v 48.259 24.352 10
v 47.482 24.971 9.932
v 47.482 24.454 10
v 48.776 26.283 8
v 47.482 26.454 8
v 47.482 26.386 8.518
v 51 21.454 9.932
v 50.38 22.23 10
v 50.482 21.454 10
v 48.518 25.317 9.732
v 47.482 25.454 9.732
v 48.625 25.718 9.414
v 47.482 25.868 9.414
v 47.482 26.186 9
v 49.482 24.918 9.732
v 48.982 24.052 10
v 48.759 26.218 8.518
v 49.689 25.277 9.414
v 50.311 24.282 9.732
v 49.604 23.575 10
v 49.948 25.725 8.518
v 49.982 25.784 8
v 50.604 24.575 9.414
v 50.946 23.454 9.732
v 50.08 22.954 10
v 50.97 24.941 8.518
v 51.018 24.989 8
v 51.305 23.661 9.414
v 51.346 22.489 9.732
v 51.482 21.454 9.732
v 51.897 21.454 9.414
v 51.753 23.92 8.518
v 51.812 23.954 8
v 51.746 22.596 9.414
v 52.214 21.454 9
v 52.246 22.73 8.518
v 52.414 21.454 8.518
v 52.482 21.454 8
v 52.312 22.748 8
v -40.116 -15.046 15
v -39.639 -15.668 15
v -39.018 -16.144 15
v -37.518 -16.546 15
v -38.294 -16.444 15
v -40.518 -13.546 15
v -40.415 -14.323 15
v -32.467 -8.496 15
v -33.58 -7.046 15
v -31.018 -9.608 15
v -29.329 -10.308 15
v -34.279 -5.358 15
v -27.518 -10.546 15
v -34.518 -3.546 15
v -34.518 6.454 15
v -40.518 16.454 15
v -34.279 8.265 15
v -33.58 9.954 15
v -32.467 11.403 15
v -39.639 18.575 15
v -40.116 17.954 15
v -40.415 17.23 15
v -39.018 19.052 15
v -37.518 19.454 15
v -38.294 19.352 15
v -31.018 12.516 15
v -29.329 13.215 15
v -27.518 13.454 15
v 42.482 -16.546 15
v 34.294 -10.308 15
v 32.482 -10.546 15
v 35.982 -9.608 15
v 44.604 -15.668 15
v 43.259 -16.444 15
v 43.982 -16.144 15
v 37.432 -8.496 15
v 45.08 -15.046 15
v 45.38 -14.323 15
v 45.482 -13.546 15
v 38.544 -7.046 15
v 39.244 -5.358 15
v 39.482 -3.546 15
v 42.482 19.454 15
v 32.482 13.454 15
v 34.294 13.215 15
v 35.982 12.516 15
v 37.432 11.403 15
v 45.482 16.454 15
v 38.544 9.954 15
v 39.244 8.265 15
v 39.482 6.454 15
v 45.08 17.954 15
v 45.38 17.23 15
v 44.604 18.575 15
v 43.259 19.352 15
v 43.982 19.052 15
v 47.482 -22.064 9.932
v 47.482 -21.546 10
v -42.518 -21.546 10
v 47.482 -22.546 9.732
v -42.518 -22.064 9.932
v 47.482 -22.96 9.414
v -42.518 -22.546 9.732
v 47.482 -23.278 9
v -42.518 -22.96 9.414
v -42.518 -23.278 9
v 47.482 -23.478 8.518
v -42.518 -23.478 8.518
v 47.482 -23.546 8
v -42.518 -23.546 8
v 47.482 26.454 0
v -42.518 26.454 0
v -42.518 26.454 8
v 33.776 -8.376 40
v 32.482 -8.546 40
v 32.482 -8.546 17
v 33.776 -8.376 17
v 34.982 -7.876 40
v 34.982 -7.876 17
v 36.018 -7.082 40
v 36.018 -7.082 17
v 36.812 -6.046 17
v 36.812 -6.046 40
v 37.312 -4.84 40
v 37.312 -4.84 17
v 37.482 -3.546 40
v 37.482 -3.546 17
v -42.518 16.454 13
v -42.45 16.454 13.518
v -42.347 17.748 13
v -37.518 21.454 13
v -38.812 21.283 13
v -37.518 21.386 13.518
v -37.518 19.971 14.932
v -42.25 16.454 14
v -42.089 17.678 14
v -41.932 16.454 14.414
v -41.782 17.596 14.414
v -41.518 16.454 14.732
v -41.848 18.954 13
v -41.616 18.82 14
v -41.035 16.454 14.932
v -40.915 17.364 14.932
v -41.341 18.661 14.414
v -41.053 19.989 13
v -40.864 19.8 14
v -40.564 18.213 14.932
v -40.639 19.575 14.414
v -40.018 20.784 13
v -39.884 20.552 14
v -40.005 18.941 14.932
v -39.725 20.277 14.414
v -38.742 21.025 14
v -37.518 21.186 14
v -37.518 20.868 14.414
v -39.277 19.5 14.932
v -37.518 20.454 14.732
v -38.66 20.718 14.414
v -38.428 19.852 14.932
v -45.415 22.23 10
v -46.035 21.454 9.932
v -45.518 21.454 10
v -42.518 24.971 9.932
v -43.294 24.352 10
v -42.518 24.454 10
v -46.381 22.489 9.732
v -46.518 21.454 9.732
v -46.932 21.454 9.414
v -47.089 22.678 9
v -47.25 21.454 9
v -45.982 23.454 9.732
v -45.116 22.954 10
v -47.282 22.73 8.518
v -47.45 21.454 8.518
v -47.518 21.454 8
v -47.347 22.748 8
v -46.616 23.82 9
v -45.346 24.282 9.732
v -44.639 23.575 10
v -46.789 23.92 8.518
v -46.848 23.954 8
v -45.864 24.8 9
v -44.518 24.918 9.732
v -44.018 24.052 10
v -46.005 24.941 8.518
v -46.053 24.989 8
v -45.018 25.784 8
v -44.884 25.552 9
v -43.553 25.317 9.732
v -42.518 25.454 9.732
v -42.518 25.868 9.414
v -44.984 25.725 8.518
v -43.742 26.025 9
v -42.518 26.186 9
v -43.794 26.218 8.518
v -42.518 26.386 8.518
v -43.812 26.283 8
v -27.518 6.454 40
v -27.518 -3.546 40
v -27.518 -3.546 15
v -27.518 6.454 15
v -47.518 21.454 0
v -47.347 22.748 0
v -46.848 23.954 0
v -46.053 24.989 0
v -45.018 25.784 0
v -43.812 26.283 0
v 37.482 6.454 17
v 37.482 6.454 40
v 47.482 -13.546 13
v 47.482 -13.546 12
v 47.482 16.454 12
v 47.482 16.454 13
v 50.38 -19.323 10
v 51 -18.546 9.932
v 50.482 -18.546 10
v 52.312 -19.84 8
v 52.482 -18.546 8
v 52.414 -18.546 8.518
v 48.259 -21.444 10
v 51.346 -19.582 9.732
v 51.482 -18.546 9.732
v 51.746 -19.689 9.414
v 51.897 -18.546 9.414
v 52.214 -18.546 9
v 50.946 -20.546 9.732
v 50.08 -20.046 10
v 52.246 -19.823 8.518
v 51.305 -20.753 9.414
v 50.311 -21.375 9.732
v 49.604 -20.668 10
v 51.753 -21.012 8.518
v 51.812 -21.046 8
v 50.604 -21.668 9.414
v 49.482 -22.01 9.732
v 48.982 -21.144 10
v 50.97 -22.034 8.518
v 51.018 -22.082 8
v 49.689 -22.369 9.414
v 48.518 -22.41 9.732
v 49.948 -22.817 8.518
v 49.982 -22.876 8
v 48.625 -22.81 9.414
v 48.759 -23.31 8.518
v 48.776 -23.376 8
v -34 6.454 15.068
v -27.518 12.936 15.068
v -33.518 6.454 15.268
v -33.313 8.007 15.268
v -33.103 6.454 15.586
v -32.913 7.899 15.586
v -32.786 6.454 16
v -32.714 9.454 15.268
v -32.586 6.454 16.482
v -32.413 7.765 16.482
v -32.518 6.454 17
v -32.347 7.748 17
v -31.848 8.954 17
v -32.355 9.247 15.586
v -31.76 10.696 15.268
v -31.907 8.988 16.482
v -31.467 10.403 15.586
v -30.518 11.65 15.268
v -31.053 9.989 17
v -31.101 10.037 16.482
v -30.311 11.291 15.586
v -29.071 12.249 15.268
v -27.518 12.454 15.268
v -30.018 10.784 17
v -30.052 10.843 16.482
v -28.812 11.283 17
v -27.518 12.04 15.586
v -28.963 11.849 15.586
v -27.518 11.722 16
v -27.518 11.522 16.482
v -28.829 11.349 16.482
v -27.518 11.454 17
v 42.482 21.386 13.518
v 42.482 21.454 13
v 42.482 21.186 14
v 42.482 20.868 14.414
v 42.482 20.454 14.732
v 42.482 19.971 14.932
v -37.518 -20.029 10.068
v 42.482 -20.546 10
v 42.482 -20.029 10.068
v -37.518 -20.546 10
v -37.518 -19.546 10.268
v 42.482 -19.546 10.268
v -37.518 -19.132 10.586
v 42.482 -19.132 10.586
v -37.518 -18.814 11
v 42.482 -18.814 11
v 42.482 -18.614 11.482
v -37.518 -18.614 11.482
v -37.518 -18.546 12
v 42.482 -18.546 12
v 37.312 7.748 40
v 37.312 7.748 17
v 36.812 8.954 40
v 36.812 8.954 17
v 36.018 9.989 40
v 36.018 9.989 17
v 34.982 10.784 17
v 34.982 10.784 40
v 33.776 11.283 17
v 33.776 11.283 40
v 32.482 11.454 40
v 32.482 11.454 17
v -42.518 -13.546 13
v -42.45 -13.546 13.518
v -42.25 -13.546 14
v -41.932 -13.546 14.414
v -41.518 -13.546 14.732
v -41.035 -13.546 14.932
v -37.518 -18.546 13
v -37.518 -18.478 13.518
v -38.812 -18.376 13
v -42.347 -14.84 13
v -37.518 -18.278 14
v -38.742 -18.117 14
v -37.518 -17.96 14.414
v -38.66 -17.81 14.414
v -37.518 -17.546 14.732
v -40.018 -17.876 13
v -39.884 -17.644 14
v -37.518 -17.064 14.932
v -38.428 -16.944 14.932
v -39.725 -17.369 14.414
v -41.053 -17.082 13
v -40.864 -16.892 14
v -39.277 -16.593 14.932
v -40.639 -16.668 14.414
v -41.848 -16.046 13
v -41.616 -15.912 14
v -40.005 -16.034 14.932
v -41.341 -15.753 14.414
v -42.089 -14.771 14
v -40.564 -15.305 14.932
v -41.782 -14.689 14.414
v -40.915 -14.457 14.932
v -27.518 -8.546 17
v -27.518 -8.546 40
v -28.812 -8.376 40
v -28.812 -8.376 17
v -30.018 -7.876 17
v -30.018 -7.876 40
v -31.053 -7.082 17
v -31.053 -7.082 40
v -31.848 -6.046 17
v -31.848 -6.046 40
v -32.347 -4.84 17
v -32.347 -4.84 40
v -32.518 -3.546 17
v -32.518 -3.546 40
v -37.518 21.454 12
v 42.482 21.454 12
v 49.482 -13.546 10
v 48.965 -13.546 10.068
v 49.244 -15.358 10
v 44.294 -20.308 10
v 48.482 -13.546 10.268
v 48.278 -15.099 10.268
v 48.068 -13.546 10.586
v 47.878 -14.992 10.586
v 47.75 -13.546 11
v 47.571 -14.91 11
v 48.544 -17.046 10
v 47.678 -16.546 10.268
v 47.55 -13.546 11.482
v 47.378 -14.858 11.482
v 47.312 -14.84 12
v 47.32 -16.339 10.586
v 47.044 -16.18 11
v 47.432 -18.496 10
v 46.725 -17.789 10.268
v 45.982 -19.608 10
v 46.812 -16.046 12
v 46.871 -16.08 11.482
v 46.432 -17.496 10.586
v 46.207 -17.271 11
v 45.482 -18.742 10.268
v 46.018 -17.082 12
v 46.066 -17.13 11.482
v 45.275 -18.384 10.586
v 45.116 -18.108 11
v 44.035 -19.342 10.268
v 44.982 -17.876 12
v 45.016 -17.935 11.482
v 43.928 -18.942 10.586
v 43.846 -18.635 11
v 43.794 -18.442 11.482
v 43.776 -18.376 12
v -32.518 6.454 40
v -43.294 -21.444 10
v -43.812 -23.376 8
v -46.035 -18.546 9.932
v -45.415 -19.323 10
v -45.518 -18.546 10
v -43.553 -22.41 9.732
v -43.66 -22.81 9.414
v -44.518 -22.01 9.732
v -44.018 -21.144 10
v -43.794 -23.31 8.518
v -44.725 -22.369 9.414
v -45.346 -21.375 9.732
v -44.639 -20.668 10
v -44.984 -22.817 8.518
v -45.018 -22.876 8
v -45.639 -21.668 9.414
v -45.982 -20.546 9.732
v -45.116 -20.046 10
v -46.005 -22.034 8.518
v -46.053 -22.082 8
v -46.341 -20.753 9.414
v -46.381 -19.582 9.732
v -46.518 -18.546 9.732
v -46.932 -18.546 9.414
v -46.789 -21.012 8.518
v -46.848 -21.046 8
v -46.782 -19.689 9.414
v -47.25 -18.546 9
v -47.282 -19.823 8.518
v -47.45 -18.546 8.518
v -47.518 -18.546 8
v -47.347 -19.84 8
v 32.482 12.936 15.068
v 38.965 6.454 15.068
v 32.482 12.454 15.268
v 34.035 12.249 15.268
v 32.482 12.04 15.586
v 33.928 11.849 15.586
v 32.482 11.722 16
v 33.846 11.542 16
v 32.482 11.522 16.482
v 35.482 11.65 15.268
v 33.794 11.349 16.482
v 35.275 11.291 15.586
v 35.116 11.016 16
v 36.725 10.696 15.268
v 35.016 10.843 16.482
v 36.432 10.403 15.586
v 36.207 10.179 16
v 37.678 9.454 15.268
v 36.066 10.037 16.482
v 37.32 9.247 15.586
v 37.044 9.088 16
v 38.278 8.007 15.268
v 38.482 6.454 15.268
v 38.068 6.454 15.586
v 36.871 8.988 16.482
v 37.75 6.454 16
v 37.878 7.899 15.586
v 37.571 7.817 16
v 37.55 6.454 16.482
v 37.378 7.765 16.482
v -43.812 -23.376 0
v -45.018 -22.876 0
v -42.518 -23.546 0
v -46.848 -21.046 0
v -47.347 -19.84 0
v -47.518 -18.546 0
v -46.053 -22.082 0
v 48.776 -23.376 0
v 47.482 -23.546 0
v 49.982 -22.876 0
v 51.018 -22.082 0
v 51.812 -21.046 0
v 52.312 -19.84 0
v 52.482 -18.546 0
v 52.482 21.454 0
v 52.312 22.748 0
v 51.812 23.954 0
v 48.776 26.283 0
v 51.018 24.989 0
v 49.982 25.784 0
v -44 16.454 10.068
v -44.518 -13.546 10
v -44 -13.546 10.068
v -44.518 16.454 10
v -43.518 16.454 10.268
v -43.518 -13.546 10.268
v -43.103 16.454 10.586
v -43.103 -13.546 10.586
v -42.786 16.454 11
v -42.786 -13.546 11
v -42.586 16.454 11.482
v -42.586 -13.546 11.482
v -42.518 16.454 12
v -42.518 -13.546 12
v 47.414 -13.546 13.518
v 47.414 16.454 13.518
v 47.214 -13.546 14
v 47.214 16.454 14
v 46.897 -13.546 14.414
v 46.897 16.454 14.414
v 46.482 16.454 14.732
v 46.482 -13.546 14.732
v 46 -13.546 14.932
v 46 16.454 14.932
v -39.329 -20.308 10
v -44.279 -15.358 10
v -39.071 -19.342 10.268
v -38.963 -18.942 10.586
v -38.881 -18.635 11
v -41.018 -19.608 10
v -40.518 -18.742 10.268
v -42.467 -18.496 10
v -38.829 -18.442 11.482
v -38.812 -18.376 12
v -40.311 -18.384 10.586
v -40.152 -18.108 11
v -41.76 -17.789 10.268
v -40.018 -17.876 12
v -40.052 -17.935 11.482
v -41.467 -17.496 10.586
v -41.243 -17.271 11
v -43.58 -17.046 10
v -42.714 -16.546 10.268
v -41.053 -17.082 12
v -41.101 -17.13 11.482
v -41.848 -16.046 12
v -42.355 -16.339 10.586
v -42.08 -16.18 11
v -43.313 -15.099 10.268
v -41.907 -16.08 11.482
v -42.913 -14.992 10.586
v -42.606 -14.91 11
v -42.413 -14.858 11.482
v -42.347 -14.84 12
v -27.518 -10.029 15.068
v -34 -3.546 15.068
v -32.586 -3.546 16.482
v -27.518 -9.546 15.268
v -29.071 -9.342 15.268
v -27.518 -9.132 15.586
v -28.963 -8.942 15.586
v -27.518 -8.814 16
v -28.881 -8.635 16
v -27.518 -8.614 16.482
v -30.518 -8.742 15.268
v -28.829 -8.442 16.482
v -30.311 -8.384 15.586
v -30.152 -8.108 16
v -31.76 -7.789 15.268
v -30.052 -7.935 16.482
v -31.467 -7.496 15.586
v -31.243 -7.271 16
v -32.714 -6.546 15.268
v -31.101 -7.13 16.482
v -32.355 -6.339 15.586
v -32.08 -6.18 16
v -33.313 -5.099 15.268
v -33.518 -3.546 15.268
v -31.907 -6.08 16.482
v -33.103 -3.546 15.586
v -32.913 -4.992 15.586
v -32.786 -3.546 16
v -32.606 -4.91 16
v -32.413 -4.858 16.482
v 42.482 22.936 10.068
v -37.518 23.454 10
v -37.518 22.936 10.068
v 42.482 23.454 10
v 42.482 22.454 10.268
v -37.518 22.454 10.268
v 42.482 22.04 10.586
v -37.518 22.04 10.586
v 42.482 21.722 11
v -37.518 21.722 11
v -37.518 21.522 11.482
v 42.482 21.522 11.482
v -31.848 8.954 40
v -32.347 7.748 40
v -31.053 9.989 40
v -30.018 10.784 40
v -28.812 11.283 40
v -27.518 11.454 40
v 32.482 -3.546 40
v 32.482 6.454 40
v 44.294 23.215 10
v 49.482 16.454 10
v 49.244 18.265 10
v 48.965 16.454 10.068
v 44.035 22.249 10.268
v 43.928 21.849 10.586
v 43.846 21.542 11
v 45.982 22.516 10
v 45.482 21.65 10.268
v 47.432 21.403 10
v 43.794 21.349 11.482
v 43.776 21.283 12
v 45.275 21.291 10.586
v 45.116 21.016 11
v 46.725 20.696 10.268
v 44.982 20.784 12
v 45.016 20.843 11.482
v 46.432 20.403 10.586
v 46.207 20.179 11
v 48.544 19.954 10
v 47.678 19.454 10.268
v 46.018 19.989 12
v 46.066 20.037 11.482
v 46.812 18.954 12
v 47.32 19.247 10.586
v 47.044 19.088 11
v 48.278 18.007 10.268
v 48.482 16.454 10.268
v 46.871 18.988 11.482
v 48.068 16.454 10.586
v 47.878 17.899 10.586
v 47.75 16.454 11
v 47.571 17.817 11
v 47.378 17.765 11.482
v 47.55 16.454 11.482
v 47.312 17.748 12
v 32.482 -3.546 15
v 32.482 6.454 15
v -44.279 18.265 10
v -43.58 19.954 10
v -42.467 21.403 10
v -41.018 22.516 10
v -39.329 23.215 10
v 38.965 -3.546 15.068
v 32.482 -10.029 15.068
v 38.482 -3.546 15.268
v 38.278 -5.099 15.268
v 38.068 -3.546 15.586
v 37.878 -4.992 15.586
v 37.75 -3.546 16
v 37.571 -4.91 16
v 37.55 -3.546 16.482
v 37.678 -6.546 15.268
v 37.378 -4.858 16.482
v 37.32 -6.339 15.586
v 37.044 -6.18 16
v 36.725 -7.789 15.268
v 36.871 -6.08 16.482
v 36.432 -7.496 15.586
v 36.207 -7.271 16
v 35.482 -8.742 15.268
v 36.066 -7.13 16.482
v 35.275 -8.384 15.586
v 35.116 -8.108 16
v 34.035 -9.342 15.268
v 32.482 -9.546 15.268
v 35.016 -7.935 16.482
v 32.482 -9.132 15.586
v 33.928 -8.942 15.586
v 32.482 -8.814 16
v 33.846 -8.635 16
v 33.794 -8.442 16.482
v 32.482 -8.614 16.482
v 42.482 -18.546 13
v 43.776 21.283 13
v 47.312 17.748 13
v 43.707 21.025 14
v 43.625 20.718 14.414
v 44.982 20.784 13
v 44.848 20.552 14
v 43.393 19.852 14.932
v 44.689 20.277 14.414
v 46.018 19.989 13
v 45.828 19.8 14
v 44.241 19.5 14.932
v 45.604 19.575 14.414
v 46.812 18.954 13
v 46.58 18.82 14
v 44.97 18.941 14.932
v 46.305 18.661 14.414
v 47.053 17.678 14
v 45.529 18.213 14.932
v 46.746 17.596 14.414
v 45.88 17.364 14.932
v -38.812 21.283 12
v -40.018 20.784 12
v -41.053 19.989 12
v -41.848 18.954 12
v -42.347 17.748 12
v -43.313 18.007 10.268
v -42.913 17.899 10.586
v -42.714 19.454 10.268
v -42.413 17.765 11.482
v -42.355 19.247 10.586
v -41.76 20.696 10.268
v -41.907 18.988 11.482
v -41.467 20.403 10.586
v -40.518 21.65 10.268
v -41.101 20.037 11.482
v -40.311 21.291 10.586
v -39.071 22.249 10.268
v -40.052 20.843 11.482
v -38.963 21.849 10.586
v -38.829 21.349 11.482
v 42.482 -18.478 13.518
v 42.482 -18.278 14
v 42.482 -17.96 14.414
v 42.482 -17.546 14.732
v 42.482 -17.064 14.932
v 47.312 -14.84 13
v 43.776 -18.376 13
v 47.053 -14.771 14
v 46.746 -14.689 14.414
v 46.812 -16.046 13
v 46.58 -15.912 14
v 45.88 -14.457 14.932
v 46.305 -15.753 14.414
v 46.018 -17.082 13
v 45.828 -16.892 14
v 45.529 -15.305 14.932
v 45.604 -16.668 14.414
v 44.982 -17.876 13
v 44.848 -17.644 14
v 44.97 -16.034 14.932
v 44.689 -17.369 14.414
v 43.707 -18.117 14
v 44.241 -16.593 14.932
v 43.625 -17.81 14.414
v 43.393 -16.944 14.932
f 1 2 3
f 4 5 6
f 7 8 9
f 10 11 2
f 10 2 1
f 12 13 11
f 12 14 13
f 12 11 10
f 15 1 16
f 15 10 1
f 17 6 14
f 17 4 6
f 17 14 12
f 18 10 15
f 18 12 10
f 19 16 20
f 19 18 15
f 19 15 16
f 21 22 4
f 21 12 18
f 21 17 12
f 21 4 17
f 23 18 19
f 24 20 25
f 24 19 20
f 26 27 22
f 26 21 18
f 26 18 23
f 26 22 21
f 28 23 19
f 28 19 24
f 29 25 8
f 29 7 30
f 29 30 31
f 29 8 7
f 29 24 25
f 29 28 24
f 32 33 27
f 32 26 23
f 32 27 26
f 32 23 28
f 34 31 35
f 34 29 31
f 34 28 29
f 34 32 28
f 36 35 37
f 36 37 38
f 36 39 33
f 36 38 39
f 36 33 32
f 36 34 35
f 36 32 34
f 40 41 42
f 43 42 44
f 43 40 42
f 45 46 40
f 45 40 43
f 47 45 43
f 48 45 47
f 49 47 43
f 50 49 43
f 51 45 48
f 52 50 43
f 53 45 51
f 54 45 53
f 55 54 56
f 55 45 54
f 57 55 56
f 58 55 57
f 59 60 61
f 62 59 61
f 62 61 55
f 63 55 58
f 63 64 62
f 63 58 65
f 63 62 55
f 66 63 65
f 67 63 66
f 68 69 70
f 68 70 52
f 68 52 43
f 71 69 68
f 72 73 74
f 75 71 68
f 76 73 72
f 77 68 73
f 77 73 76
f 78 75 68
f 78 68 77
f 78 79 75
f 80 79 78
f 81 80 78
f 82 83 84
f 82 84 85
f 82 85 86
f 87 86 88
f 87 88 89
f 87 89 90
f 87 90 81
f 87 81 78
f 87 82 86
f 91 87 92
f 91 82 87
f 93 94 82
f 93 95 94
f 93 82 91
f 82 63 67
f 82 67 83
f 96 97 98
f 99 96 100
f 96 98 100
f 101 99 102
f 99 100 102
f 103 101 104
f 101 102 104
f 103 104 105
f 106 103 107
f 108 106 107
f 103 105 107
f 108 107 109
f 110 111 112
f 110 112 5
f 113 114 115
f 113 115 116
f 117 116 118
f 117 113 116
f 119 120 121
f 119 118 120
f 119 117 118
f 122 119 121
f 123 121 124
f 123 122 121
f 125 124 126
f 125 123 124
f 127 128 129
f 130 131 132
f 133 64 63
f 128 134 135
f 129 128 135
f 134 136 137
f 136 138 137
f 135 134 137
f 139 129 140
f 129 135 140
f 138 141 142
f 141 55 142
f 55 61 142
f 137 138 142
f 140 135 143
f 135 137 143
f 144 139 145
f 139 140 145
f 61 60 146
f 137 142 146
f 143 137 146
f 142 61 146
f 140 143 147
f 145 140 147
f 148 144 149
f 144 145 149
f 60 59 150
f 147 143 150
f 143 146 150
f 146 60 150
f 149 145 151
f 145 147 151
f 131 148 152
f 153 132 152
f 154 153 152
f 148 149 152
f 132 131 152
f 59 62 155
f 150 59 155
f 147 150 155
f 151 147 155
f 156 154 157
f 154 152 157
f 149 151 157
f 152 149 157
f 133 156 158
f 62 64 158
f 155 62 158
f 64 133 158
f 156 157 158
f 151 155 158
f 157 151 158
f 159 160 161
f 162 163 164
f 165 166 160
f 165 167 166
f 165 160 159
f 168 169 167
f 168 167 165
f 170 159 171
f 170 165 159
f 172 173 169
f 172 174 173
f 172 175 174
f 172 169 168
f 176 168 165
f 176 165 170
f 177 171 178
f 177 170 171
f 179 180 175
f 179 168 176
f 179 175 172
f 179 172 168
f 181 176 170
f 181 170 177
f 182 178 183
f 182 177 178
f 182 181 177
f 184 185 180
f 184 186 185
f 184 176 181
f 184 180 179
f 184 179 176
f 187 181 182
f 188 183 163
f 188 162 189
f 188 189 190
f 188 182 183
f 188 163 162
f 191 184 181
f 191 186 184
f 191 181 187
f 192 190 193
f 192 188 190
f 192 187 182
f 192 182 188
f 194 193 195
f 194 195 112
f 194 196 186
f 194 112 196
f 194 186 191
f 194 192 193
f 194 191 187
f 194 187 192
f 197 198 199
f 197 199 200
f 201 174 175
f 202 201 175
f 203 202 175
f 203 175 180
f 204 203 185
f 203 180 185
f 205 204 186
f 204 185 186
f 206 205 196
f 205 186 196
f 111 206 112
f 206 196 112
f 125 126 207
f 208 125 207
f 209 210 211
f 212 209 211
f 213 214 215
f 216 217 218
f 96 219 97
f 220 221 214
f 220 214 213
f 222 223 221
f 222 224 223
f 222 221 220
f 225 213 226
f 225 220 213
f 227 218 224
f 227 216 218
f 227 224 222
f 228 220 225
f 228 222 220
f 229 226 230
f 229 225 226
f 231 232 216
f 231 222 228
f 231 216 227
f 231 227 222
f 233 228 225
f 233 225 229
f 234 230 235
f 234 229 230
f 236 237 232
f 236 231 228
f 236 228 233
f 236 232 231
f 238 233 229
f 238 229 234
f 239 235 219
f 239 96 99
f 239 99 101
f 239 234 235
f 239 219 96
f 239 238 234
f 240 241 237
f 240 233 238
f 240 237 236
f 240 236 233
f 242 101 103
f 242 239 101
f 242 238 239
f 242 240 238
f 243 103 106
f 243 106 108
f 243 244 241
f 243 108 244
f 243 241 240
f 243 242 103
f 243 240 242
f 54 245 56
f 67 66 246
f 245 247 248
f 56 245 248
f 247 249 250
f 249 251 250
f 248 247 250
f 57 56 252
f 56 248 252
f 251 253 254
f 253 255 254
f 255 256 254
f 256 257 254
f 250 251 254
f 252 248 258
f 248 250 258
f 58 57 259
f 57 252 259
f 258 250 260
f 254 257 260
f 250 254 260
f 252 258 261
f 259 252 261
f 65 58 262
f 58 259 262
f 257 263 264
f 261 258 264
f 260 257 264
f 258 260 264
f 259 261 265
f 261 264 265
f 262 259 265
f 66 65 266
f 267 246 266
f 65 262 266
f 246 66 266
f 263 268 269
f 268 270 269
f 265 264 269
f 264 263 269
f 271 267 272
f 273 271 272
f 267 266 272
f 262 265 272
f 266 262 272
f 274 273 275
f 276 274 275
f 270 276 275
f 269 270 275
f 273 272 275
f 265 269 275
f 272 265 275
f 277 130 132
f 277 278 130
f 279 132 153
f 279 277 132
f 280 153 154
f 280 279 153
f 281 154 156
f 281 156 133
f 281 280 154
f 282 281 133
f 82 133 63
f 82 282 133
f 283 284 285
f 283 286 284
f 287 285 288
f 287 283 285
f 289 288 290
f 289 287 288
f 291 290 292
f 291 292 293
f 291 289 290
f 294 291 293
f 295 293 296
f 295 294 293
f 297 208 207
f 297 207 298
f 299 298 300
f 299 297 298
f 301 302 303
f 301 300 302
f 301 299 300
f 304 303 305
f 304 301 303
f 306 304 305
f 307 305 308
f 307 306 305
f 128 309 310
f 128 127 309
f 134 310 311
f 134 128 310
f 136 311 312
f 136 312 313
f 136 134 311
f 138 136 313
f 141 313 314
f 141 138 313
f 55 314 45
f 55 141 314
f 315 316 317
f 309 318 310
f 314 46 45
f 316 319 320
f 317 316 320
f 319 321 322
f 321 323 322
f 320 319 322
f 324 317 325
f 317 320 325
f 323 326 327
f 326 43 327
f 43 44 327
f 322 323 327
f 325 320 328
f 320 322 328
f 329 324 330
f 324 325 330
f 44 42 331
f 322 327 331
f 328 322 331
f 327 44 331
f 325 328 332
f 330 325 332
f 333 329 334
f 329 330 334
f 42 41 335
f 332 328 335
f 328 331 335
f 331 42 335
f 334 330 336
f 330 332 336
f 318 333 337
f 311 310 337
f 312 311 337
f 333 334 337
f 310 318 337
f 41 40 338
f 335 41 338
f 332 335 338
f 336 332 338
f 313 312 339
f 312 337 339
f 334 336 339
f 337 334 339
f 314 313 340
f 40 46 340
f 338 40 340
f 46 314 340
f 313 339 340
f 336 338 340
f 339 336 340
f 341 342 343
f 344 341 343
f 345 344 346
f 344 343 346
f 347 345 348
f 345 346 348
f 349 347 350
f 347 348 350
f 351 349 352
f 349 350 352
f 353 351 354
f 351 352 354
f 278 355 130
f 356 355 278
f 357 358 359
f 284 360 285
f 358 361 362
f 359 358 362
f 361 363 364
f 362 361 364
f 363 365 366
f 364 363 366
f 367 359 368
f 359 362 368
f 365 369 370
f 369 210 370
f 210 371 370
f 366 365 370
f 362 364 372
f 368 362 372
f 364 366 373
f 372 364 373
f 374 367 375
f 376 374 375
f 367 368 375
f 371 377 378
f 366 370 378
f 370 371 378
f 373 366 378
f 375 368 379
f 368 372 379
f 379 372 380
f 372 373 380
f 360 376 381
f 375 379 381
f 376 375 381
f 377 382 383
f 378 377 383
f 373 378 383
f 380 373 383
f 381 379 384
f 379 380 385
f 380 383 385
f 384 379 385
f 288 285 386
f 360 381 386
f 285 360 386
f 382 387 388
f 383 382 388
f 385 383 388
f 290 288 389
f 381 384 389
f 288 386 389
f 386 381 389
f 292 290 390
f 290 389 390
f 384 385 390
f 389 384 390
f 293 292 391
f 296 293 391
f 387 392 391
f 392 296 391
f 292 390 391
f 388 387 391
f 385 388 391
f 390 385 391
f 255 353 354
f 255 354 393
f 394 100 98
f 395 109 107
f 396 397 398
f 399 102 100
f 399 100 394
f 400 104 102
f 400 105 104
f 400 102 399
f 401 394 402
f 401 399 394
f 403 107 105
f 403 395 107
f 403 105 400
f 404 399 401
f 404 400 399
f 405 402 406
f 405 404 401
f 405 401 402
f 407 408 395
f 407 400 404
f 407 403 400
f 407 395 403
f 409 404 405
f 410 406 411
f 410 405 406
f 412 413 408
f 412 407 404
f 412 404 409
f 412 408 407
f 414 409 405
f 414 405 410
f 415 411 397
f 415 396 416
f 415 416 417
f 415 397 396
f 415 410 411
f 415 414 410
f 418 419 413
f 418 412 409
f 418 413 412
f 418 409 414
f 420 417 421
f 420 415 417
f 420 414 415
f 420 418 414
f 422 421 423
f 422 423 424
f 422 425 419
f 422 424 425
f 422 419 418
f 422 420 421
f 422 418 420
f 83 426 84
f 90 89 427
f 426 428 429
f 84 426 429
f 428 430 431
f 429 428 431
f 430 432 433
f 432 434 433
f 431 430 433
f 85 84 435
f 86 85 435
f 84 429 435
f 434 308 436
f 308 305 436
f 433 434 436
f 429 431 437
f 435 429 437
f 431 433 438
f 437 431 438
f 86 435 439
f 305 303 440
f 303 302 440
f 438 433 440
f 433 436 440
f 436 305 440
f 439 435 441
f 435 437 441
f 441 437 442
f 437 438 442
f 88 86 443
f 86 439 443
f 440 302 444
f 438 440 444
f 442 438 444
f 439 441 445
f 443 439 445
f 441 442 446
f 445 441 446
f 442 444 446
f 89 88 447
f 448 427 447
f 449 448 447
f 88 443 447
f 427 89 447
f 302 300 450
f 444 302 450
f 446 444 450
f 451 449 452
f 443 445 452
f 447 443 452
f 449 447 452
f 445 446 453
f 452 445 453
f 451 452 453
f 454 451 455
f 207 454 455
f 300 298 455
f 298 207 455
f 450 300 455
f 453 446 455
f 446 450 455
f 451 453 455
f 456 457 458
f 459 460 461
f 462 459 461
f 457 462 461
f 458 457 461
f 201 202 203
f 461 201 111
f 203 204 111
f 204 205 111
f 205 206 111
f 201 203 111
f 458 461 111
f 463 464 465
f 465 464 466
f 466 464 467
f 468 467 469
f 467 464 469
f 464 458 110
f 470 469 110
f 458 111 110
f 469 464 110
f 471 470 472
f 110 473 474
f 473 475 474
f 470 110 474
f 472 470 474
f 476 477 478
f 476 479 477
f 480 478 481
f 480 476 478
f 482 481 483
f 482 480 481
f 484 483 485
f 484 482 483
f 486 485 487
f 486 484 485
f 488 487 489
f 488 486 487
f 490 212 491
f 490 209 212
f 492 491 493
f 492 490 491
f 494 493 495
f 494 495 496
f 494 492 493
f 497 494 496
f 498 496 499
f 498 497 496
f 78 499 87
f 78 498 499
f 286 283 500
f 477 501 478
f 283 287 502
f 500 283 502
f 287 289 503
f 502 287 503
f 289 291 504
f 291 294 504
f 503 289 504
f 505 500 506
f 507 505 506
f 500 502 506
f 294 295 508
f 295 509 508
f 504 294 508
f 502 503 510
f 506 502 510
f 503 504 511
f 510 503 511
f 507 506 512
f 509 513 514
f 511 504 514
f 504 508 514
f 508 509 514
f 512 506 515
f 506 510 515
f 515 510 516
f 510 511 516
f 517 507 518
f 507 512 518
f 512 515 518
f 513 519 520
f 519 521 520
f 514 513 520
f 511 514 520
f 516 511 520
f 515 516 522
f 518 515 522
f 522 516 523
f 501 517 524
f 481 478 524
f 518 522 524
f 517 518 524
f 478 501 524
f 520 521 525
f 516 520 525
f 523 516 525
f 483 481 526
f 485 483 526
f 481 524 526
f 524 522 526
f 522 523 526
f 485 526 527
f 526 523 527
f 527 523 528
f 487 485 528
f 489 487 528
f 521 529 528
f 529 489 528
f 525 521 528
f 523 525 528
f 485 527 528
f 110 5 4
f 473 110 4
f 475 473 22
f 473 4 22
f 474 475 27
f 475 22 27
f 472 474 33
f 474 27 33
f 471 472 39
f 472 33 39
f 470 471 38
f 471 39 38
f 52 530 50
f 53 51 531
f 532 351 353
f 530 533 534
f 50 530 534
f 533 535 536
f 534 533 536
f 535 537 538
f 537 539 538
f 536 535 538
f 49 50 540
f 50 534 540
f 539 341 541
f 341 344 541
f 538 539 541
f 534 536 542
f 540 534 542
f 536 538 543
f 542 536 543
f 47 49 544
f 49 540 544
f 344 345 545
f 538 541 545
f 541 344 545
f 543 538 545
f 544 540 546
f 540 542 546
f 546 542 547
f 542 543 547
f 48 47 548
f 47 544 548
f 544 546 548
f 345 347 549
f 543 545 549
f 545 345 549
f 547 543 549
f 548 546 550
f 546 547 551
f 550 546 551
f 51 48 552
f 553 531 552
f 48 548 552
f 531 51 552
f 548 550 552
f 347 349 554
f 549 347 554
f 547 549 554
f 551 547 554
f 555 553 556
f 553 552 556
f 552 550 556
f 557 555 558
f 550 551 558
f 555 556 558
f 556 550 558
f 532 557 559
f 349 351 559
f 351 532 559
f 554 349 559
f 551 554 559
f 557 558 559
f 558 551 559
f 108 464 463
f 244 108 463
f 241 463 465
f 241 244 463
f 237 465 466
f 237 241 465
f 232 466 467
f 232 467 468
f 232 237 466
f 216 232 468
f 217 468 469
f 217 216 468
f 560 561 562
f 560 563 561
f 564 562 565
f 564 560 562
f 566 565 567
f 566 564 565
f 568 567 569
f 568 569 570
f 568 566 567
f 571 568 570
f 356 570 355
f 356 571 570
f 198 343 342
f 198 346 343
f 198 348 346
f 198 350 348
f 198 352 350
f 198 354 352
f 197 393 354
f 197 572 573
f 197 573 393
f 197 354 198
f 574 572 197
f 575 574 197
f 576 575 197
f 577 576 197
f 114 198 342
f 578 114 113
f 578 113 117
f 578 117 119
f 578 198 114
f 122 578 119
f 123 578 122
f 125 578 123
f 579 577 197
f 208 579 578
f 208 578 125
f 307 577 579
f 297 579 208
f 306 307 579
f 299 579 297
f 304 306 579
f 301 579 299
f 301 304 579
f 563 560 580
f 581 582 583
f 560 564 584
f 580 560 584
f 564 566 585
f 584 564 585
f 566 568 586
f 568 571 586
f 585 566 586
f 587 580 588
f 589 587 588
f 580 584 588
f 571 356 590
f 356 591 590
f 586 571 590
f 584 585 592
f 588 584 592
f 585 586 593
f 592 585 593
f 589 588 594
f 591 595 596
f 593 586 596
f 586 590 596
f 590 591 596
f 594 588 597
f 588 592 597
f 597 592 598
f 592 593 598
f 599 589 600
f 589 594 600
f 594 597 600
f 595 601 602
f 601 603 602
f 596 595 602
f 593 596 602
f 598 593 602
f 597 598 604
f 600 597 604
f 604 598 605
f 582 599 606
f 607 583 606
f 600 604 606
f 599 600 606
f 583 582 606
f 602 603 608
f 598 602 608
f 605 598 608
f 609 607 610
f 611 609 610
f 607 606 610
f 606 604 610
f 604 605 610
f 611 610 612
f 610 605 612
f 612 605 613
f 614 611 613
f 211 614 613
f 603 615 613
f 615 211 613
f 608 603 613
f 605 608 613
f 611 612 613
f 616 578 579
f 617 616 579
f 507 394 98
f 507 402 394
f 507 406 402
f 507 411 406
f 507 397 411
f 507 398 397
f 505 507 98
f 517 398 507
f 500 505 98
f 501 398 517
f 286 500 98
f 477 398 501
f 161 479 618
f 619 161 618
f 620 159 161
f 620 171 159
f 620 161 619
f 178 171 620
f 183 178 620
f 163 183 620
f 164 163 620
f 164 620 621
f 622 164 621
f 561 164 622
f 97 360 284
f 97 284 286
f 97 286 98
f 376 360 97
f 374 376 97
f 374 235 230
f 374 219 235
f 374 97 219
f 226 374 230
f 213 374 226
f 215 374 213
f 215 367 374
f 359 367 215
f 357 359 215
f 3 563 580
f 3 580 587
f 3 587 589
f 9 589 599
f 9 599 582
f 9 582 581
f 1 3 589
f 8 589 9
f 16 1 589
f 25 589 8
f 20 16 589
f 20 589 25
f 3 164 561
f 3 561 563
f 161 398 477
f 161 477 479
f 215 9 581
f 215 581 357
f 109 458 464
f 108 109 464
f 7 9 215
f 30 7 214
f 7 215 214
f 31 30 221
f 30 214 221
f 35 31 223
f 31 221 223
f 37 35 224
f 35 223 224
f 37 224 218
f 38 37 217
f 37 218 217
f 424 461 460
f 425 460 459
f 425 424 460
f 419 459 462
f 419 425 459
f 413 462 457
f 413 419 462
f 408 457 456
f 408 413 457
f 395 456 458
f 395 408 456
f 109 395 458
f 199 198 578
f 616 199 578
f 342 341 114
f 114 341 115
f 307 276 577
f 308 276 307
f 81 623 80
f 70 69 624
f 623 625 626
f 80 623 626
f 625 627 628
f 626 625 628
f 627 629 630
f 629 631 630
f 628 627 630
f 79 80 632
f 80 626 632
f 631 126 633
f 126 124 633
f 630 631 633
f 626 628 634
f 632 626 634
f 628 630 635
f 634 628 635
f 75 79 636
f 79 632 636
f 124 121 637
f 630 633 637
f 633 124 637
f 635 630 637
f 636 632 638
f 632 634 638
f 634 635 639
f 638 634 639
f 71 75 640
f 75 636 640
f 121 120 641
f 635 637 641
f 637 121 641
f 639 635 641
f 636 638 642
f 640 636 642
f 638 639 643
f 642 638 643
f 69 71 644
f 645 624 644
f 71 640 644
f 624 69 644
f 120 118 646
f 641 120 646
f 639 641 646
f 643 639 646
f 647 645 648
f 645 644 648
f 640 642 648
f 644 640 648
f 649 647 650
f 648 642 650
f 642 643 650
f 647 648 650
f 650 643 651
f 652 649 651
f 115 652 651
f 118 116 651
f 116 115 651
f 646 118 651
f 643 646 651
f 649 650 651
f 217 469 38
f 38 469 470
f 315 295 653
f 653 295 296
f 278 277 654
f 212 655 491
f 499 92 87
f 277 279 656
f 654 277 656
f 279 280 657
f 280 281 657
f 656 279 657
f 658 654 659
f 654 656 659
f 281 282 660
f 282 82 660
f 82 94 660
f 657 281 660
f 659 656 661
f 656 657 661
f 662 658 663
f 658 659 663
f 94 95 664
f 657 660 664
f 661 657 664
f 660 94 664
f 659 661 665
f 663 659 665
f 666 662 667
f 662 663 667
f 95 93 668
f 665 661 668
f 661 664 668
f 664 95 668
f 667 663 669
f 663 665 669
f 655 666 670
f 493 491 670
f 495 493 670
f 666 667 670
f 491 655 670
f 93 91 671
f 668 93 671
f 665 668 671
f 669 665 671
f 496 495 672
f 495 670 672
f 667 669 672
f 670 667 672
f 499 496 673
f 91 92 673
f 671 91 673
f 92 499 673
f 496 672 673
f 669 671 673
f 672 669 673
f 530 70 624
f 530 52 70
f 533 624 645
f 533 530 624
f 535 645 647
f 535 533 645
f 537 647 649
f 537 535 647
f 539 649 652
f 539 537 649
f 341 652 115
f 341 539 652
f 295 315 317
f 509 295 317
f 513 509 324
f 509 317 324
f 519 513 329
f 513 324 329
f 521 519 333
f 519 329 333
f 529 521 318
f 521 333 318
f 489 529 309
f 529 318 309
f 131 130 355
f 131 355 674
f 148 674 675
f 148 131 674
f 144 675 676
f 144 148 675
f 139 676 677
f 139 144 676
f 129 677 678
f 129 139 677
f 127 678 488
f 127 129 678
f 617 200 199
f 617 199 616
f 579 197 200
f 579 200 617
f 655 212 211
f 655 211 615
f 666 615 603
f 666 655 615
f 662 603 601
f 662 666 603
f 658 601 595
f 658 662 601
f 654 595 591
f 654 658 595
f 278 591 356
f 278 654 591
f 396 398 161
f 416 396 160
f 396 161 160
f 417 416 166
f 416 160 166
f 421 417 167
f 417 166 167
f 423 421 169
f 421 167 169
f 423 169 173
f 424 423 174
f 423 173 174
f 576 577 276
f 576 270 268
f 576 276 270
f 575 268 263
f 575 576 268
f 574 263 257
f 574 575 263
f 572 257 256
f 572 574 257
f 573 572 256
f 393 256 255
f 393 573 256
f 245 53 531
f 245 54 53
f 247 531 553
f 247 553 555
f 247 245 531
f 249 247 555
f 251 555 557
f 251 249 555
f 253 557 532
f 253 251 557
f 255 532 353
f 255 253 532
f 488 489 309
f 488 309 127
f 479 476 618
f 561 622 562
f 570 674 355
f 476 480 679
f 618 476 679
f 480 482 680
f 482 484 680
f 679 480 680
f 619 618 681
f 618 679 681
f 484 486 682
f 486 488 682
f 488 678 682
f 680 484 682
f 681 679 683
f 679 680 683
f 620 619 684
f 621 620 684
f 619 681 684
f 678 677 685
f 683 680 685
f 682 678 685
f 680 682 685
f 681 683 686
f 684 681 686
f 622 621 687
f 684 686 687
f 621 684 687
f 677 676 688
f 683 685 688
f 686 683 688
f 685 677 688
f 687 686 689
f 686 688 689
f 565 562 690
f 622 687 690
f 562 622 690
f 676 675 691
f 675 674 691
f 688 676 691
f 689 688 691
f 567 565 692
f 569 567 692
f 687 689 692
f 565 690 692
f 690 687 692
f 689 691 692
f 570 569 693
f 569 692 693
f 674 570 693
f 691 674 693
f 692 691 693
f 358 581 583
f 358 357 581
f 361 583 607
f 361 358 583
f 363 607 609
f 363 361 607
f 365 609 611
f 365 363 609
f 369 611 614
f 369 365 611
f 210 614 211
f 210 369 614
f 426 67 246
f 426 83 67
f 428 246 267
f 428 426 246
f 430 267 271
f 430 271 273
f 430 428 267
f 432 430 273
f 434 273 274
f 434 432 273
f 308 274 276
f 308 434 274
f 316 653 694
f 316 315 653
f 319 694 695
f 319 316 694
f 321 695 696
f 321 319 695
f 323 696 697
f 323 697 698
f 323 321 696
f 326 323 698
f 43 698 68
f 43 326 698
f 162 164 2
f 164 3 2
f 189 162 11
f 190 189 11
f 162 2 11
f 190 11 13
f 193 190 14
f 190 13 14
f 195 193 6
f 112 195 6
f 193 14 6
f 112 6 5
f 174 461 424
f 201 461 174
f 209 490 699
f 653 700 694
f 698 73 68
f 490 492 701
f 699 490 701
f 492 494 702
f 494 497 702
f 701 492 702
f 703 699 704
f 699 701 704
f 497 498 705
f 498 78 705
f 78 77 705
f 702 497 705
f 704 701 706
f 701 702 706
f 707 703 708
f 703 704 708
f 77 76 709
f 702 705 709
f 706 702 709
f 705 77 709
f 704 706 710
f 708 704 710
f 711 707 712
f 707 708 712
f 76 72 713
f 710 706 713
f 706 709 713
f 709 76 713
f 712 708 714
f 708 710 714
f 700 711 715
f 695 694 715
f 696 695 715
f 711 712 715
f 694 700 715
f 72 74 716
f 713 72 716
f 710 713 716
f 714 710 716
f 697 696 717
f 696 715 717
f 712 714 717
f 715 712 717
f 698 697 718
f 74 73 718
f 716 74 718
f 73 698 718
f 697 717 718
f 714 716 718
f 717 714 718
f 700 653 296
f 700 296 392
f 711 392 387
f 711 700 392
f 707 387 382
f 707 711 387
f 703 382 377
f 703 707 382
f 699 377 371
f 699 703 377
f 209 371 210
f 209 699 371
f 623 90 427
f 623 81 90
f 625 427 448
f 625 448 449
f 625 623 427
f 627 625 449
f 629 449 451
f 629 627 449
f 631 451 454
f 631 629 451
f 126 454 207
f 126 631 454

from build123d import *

# Parameters (mm, degrees)
F0_W     = 100
F0_H     = 50
F1_DEPTH = 10
F2_W     = 90
F2_H     = 40
F3_DEPTH = 5
F4_W     = 70
F4_H     = 20
F5_DEPTH = 25
F6_W     = 60
F6_H     = 10
F7_DEPTH = 25
F8_R     = 5
F9_R     = 5
F10_R    = 5
F11_R    = 2


with BuildPart() as f1:
    # F0 (on Top) → F1 (new body)
    with BuildSketch(Plane.XY):
        with Locations((2.482289, 1.45373)):
            Rectangle(F0_W, F0_H)
    extrude(amount=F1_DEPTH)

    # F2 (on face) → F3 (join)
    with BuildSketch(Plane.XY.offset(10)):
        with Locations((2.482289, 1.45373)):
            Rectangle(F2_W, F2_H)
    extrude(amount=F3_DEPTH)

    # F4 (on face) → F5 (join)
    with BuildSketch(Plane.XY.offset(15)):
        with Locations((2.482289, 1.45373)):
            Rectangle(F4_W, F4_H)
    extrude(amount=F5_DEPTH)

    # F6 (on face) → F7 (cut)
    with BuildSketch(Plane.XY.offset(40)):
        with Locations((2.482289, 1.45373)):
            Rectangle(F6_W, F6_H)
    extrude(amount=-F7_DEPTH, mode=Mode.SUBTRACT)

    # F8
    f8_edges = [f1.edges().sort_by_distance(p)[0] for p in [
        (37.482289, -8.54627, 27.5),
        (37.482289, 11.45373, 27.5),
        (-32.517711, -8.54627, 27.5),
        (-32.517711, 11.45373, 27.5),
    ]]
    fillet(f8_edges, radius=F8_R)

    # F9
    f9_edges = [f1.edges().sort_by_distance(p)[0] for p in [
        (52.482289, 26.45373, 5),
        (-47.517711, -23.54627, 5),
        (-47.517711, 26.45373, 5),
        (52.482289, -23.54627, 5),
    ]]
    fillet(f9_edges, radius=F9_R)

    # F10
    f10_edges = [f1.edges().sort_by_distance(p)[0] for p in [
        (47.482289, -18.54627, 12.5),
        (-42.517711, -18.54627, 12.5),
        (47.482289, 21.45373, 12.5),
        (-42.517711, 21.45373, 12.5),
    ]]
    fillet(f10_edges, radius=F10_R)

    # F11
    f11_edges = [f1.edges().sort_by_distance(p)[0] for p in [
        (2.482289, 11.45373, 15),
        (2.482289, 21.45373, 15),
        (2.482289, 21.45373, 10),
        (2.482289, 26.45373, 10),
    ]]
    fillet(f11_edges, radius=F11_R)


solid = f1.part
